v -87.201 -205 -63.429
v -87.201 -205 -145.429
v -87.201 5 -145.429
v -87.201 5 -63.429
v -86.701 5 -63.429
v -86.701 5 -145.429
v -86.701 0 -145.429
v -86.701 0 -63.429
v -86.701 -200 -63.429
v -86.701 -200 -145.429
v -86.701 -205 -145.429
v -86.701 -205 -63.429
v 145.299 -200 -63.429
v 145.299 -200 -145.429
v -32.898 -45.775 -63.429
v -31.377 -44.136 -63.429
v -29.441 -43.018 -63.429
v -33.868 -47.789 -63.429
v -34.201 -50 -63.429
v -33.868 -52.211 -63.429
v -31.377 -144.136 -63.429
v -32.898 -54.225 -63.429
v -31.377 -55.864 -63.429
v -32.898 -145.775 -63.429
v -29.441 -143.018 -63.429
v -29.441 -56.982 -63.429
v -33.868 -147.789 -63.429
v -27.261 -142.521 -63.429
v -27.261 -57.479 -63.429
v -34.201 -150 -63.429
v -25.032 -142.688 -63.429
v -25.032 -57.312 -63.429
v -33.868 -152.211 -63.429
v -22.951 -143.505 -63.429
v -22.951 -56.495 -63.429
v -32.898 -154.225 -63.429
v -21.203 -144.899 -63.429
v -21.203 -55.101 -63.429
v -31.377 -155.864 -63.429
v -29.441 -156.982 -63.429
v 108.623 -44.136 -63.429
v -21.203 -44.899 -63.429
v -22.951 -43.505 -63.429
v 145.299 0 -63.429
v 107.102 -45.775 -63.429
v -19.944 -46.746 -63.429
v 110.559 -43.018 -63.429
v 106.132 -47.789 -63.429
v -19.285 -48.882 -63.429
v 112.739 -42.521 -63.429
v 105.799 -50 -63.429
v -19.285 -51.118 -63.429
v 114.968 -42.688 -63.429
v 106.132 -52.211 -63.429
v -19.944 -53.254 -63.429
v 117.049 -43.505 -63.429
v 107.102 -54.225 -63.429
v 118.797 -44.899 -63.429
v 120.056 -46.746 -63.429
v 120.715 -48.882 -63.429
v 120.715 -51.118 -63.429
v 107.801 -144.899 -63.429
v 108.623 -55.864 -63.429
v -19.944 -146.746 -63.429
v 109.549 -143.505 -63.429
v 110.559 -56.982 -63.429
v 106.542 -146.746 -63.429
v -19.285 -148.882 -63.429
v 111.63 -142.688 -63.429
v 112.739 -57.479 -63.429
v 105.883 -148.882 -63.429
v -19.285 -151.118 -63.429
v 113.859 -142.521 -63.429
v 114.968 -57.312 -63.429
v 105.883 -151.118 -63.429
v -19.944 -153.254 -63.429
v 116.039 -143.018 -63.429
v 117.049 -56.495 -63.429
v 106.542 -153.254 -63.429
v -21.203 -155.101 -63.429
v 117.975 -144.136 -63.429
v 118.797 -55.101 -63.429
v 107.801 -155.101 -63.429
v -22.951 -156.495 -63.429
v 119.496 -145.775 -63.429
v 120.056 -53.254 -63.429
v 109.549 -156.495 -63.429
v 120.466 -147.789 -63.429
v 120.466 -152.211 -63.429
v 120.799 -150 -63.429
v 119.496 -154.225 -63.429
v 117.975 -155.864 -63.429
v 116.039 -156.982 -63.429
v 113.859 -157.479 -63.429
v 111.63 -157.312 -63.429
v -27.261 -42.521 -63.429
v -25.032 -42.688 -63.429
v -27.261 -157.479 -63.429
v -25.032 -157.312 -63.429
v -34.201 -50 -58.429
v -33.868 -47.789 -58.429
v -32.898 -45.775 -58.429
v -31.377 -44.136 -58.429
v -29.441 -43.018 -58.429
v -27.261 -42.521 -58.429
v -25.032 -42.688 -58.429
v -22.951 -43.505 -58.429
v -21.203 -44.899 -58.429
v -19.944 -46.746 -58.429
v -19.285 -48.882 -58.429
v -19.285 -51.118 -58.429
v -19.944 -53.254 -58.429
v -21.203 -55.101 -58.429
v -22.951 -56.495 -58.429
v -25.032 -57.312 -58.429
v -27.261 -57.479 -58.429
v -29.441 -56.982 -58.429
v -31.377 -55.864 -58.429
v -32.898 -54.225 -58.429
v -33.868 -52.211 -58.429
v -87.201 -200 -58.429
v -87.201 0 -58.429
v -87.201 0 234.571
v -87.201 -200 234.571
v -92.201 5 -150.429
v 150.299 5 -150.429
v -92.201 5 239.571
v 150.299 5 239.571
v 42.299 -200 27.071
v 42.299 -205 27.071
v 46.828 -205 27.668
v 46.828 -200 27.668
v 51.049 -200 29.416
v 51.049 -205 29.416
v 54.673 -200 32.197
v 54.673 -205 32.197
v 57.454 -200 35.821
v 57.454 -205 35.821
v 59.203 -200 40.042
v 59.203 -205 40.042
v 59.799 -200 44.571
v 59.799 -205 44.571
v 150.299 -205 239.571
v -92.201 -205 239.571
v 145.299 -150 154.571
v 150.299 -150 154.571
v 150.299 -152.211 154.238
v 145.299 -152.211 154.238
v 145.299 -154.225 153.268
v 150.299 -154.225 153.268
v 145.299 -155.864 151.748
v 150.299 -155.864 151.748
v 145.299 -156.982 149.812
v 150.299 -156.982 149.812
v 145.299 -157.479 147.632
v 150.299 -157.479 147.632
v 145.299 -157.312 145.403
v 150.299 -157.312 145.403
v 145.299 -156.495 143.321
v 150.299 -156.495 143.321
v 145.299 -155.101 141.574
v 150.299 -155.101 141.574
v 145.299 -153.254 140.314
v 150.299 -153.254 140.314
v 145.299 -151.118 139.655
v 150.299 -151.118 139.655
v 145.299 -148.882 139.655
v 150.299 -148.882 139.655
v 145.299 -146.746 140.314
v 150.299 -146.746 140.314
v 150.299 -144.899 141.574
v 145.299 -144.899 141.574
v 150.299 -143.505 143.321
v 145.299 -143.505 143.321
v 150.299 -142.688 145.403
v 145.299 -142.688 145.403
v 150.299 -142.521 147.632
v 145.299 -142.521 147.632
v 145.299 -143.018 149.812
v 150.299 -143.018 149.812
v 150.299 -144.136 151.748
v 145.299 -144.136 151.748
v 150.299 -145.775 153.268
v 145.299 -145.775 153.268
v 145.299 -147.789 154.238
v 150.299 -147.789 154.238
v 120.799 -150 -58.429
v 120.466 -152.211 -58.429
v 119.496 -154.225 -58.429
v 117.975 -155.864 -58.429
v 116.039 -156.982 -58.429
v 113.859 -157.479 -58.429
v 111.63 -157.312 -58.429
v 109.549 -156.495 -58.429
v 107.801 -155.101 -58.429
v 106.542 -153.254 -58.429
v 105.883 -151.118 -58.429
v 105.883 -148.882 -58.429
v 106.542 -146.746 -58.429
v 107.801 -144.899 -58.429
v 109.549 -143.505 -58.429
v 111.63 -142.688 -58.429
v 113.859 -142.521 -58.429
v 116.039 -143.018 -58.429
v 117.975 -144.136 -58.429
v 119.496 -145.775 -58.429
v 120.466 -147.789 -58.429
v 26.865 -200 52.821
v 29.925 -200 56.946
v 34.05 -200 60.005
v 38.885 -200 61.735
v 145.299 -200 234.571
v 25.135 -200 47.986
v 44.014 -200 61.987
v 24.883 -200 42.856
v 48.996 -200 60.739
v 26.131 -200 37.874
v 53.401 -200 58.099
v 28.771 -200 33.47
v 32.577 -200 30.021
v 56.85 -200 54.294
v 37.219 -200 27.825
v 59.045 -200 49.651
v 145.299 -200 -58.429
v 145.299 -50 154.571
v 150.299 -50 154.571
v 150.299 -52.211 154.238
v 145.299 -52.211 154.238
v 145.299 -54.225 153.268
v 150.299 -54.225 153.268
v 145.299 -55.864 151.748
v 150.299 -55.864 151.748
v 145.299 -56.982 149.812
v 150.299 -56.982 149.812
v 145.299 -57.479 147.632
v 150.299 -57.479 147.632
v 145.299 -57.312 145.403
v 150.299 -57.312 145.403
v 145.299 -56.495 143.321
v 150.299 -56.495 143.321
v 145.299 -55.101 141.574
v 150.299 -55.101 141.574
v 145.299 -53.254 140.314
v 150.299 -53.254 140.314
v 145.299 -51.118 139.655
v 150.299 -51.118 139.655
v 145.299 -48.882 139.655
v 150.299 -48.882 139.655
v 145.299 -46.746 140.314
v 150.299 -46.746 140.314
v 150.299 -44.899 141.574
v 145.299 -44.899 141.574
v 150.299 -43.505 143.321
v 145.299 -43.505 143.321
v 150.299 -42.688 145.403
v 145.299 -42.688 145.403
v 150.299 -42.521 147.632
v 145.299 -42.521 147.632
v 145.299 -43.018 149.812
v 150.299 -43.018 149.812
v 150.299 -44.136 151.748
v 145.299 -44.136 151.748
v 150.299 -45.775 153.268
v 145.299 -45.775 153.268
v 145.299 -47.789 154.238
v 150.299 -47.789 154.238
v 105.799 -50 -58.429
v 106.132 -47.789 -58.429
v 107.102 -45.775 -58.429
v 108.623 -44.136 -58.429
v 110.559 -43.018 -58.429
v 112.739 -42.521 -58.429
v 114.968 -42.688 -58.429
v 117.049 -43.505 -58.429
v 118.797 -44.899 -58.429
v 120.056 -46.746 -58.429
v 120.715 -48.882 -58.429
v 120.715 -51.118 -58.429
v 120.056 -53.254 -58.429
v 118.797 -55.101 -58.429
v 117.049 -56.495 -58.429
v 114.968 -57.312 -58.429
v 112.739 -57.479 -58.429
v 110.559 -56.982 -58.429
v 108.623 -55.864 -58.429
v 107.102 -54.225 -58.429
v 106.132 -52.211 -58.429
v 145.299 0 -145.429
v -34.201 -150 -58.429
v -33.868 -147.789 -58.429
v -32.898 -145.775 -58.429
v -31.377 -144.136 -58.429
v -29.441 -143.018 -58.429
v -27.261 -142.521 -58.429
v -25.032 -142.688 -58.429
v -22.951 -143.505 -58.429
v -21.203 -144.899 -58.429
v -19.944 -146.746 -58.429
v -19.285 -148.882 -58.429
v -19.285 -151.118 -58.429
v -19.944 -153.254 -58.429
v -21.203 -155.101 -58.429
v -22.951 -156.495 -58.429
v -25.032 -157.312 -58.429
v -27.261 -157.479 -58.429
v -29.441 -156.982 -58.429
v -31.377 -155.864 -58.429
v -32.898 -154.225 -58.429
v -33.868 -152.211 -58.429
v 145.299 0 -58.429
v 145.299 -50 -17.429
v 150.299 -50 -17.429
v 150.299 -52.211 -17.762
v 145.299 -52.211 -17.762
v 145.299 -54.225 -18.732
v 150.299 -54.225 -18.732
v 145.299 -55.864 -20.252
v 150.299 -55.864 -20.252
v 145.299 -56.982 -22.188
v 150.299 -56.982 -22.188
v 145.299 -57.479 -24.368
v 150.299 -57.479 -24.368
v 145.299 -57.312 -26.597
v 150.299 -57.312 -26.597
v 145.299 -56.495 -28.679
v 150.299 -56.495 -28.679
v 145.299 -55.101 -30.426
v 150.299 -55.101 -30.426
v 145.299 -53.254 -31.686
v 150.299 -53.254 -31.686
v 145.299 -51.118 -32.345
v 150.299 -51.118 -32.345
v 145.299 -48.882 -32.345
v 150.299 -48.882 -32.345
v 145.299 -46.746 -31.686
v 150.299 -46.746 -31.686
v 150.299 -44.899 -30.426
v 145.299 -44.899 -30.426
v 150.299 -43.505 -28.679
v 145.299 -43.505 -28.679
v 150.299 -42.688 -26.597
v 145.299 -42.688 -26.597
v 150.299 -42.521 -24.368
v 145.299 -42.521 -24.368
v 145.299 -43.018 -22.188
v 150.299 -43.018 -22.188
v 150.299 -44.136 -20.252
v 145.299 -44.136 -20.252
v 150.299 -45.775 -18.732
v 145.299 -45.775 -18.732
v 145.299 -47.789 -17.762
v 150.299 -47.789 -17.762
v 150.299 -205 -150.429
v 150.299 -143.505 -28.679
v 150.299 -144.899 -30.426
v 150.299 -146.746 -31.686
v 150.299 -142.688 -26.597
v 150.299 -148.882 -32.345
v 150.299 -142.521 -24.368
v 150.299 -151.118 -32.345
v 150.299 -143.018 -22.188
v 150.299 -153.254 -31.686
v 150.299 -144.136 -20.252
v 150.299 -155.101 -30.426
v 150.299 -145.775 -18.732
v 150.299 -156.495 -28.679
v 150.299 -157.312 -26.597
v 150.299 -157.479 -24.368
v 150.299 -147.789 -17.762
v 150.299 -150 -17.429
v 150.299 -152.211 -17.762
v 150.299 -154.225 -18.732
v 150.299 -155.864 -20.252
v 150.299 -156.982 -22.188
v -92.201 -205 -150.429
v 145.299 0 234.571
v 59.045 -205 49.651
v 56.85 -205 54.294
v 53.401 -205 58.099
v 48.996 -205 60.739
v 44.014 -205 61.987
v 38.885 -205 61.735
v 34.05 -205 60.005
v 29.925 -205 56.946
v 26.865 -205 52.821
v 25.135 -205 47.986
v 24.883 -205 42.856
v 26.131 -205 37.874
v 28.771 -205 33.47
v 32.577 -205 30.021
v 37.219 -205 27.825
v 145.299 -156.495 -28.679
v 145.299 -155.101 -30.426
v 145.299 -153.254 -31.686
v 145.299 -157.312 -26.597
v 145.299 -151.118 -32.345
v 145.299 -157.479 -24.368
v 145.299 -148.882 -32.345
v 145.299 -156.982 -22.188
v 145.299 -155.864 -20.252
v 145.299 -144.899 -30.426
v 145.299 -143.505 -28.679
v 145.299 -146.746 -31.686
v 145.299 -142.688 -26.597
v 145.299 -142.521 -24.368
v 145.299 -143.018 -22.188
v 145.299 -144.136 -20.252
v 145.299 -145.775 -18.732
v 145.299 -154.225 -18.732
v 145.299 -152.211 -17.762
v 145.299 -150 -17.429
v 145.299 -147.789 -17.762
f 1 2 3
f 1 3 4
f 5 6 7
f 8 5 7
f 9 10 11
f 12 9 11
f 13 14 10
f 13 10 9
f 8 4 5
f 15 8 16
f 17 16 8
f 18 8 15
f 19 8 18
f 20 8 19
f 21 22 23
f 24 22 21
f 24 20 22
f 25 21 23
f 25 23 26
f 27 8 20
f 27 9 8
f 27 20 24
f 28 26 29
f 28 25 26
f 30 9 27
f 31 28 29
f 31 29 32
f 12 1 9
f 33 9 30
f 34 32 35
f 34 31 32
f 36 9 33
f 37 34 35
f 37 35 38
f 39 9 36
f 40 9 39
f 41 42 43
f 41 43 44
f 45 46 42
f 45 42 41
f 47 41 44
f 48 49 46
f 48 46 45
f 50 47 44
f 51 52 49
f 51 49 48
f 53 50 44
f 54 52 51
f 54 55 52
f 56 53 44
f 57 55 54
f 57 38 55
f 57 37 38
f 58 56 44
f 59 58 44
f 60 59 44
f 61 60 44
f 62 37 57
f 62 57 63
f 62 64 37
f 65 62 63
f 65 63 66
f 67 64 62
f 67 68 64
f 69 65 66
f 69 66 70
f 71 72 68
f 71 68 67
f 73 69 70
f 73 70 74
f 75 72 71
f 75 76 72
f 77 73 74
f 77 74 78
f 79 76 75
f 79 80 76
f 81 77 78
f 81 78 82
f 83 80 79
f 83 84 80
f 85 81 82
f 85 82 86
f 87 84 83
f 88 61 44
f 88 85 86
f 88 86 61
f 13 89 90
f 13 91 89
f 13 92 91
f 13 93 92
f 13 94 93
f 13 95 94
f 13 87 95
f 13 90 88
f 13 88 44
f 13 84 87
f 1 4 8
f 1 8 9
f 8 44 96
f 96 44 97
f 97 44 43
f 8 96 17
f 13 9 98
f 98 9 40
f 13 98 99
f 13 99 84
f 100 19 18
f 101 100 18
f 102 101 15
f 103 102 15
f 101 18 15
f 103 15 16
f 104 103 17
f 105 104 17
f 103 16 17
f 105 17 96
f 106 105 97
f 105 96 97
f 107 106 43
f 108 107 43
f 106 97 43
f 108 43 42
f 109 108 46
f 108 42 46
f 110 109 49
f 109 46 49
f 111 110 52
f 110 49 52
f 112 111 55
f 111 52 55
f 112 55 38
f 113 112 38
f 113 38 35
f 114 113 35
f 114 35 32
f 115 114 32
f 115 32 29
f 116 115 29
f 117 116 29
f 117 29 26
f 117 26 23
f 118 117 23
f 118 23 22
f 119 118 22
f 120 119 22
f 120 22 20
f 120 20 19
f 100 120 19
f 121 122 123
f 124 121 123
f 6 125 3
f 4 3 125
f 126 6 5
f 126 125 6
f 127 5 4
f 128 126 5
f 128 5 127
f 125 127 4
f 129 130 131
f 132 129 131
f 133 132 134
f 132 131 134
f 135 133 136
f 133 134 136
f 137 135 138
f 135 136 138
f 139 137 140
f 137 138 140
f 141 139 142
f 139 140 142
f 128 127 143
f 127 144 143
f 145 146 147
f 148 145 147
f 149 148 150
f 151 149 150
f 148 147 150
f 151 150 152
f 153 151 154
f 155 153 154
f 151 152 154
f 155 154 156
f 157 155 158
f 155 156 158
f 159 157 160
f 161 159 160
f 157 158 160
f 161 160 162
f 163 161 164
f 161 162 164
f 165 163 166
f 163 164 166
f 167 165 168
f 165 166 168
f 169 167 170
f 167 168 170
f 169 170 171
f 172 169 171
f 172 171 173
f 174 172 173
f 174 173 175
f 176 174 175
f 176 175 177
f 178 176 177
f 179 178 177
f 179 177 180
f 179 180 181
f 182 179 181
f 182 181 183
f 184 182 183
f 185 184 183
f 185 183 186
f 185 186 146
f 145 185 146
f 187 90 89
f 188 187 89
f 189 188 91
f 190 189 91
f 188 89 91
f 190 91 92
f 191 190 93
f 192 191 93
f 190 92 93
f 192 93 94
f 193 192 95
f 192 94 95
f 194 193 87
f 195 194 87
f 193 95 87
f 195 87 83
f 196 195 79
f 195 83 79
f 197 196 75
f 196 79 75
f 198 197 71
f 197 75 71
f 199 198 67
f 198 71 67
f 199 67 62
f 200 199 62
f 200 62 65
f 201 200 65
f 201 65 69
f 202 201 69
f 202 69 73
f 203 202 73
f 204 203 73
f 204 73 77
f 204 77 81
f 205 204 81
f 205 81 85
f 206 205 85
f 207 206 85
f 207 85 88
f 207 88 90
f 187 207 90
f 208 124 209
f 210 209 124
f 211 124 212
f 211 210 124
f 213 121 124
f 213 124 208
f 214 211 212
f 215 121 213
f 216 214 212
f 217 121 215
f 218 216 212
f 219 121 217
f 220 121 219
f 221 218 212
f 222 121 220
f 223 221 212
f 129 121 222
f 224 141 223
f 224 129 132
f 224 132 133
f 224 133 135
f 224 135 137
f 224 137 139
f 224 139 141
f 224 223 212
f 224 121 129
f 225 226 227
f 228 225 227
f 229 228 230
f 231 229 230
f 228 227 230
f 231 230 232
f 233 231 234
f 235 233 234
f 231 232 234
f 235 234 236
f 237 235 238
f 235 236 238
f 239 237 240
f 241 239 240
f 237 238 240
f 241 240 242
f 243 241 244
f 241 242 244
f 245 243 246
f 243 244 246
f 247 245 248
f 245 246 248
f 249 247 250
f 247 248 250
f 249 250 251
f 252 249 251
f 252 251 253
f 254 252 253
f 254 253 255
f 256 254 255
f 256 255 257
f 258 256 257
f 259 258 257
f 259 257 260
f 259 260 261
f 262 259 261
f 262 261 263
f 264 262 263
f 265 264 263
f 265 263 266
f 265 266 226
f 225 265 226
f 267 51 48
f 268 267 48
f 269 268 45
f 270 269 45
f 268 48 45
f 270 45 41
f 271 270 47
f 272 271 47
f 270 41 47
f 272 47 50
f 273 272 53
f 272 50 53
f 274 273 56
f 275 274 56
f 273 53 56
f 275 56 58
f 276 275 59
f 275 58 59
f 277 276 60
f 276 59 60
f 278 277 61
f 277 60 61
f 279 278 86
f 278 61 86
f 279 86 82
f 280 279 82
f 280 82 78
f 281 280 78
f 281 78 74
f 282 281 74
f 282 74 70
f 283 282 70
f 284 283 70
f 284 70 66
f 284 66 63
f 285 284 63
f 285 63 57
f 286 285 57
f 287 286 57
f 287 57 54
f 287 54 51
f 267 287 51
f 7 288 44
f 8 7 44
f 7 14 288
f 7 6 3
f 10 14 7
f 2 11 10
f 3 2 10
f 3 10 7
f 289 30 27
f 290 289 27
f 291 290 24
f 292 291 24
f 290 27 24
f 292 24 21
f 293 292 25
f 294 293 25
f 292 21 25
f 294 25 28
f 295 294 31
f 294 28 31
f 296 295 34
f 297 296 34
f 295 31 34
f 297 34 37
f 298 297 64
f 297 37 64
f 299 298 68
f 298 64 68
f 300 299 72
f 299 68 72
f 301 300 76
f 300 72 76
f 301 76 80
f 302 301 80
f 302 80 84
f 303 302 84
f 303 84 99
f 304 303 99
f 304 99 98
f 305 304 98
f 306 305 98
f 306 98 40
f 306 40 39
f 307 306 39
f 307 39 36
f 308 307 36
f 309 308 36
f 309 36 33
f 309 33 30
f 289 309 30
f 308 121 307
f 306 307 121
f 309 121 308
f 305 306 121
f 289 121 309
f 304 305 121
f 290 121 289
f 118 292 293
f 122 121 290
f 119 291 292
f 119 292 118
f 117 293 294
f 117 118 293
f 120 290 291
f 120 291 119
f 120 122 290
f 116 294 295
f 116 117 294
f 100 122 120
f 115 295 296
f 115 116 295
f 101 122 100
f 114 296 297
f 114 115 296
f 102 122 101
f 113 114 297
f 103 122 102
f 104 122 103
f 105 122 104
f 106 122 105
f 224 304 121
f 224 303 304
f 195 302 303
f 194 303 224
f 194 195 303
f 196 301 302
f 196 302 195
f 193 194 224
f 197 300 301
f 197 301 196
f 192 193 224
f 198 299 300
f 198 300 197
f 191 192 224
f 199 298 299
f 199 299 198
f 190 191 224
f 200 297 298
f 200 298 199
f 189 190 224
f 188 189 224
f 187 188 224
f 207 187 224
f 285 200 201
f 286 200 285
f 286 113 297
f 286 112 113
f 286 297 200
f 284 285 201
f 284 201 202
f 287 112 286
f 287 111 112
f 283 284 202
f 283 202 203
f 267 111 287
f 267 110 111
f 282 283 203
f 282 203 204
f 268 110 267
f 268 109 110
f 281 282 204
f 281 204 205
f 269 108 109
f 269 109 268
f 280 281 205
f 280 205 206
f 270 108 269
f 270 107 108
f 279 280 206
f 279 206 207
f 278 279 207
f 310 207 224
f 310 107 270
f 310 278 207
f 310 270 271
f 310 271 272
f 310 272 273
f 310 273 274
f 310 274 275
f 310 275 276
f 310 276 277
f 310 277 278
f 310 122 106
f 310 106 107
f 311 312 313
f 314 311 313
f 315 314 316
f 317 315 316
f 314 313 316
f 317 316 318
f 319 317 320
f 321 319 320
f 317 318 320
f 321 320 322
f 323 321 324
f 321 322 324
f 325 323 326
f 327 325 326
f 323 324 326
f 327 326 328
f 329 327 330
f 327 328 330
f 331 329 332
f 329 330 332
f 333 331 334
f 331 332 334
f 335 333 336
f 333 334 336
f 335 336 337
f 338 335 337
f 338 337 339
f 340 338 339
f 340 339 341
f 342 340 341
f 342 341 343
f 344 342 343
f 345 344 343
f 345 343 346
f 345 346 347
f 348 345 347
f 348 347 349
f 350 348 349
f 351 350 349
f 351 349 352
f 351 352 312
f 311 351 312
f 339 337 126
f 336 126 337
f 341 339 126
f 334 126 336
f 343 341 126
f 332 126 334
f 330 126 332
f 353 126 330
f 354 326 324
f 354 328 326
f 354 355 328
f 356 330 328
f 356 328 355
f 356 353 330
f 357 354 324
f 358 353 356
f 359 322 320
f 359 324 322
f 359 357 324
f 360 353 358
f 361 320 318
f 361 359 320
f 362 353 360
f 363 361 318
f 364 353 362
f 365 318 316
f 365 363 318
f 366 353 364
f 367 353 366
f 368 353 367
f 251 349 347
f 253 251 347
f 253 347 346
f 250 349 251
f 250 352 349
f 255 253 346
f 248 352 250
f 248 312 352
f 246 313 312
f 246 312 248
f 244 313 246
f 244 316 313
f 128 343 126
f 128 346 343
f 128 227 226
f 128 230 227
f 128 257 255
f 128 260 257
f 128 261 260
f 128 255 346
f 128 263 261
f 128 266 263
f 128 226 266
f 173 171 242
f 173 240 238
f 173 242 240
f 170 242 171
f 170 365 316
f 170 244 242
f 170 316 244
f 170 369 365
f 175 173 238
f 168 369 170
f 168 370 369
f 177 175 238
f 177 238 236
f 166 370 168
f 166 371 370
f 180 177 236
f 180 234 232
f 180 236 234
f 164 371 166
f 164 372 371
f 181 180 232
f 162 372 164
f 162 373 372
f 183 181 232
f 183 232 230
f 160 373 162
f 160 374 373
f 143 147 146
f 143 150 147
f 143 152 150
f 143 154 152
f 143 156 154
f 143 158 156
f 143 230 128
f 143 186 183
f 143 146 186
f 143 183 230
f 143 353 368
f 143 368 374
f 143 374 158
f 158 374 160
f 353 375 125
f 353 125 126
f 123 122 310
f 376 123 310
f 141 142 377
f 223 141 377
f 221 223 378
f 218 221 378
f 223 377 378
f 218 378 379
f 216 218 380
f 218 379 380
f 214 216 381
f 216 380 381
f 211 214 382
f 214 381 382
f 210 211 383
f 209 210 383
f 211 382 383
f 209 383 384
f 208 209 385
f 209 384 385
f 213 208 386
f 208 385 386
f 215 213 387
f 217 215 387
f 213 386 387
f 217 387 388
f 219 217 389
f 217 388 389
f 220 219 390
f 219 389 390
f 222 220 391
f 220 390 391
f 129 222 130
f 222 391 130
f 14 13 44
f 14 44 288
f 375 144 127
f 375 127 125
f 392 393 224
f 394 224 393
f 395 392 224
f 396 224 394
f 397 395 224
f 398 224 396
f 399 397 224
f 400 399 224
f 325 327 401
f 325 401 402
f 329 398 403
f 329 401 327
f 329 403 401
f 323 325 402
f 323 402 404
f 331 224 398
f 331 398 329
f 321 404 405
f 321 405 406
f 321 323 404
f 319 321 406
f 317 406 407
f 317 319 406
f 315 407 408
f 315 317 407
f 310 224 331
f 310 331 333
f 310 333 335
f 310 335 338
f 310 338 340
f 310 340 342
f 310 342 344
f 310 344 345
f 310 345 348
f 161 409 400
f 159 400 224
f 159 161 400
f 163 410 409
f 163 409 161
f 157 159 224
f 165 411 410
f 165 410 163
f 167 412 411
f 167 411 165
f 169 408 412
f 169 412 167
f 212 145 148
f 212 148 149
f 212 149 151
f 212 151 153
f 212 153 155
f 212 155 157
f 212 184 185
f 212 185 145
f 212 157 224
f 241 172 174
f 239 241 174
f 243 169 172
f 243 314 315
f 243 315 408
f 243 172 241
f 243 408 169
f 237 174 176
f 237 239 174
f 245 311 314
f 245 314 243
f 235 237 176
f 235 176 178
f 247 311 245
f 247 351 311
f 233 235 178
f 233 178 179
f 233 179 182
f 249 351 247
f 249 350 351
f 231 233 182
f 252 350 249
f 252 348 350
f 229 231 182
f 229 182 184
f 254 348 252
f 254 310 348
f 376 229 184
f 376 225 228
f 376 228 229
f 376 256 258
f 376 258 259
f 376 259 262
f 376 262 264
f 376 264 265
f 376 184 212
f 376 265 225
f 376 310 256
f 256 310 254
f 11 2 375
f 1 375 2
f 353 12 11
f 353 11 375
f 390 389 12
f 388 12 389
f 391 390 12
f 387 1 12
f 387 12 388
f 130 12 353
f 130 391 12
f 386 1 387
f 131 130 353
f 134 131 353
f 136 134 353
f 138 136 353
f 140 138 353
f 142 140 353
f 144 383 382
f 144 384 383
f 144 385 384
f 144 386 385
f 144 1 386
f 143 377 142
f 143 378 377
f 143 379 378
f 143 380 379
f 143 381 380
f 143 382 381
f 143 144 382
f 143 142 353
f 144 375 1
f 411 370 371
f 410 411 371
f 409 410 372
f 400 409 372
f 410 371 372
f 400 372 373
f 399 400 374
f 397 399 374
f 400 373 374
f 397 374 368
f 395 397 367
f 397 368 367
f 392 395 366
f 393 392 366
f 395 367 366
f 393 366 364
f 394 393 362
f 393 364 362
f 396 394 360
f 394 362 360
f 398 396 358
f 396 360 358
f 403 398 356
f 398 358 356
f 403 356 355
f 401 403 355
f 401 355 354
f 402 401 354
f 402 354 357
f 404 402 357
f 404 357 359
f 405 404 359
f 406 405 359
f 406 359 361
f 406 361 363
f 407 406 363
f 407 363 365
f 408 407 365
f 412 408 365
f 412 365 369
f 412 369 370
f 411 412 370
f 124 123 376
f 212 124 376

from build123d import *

# Parameters (mm, degrees)
F0_W      = 232.5
F0_H      = 293
F1_DEPTH  = 200
F2_W      = 242.5
F2_H      = 5
F3_DEPTH  = 303
F5_DEPTH  = 25
F7_DEPTH  = 25
F9_DEPTH  = 210.001
F11_DEPTH = 210
F12_W     = 5
F12_H     = 82
F13_DEPTH = 232


with BuildPart() as f1:
    # F0 (on Front) → F1 (new body)
    with BuildSketch(Plane.XZ):
        Polygon((-92.2009944916, 239.5714490414), (-92.2009944916, 234.5714490414), (-92.2009944916, -63.4285509586), (150.2990055084, -63.4285509586), (150.2990055084, 239.5714490414), align=None)
        with Locations((29.0490055084, 88.0714490414)):
            Rectangle(F0_W, F0_H, mode=Mode.SUBTRACT)
    extrude(amount=F1_DEPTH)

    # F4 (on face) → F5 (cut)
    with BuildSketch(Plane.YZ.offset(150.2990055084)):
        with BuildLine():
            ThreePointArc((-42.5, 147.0714490414), (-44.6966991411, 152.3747499003), (-50, 154.5714490414))
            Line((-50, 154.5714490414), (-50, 147.0714490414))
            Line((-50, 147.0714490414), (-50, 139.5714490414))
            ThreePointArc((-50, 139.5714490414), (-44.6966991411, 141.7681481825), (-42.5, 147.0714490414))
        make_face()
        with BuildLine():
            ThreePointArc((-42.5, -24.9285509586), (-44.6966991411, -19.6252500997), (-50, -17.4285509586))
            Line((-50, -17.4285509586), (-50, -24.9285509586))
            Line((-50, -24.9285509586), (-50, -32.4285509586))
            ThreePointArc((-50, -32.4285509586), (-44.6966991411, -30.2318518175), (-42.5, -24.9285509586))
        make_face()
        with BuildLine():
            Line((-50, -24.9285509586), (-50, -17.4285509586))
            ThreePointArc((-50, -17.4285509586), (-57.5, -24.9285509586), (-50, -32.4285509586))
            Line((-50, -32.4285509586), (-50, -24.9285509586))
        make_face()
        with BuildLine():
            Line((-50, 147.0714490414), (-50, 154.5714490414))
            ThreePointArc((-50, 154.5714490414), (-57.5, 147.0714490414), (-50, 139.5714490414))
            Line((-50, 139.5714490414), (-50, 147.0714490414))
        make_face()
        with BuildLine():
            ThreePointArc((-142.5, 147.0714490414), (-144.6966991411, 152.3747499003), (-150, 154.5714490414))
            Line((-150, 154.5714490414), (-150, 147.0714490414))
            Line((-150, 147.0714490414), (-150, 139.5714490414))
            ThreePointArc((-150, 139.5714490414), (-144.6966991411, 141.7681481825), (-142.5, 147.0714490414))
        make_face()
        with BuildLine():
            ThreePointArc((-142.5, -24.9285509586), (-144.6966991411, -19.6252500997), (-150, -17.4285509586))
            Line((-150, -17.4285509586), (-150, -24.9285509586))
            Line((-150, -24.9285509586), (-150, -32.4285509586))
            ThreePointArc((-150, -32.4285509586), (-144.6966991411, -30.2318518175), (-142.5, -24.9285509586))
        make_face()
        with BuildLine():
            Line((-150, -24.9285509586), (-150, -17.4285509586))
            ThreePointArc((-150, -17.4285509586), (-157.5, -24.9285509586), (-150, -32.4285509586))
            Line((-150, -32.4285509586), (-150, -24.9285509586))
        make_face()
        with BuildLine():
            Line((-150, 147.0714490414), (-150, 154.5714490414))
            ThreePointArc((-150, 154.5714490414), (-157.5, 147.0714490414), (-150, 139.5714490414))
            Line((-150, 139.5714490414), (-150, 147.0714490414))
        make_face()
    extrude(amount=-F5_DEPTH, mode=Mode.SUBTRACT)

    # F6 (on face) → F7 (cut)
    with BuildSketch(Plane(origin=(0, 0, -63.4285509586), x_dir=(1, 0, 0), z_dir=(0, 0, -1))):
        with BuildLine():
            ThreePointArc((105.7990055084, 150), (113.2990055084, 142.5), (120.7990055084, 150))
            Line((120.7990055084, 150), (113.2990055084, 150))
            Line((113.2990055084, 150), (105.7990055084, 150))
        make_face()
        with BuildLine():
            Line((113.2990055084, 150), (120.7990055084, 150))
            ThreePointArc((120.7990055084, 150), (113.2990055084, 157.5), (105.7990055084, 150))
            Line((105.7990055084, 150), (113.2990055084, 150))
        make_face()
        with BuildLine():
            ThreePointArc((120.7990055084, 50), (113.2990055084, 57.5), (105.7990055084, 50))
            Line((105.7990055084, 50), (113.2990055084, 50))
            Line((113.2990055084, 50), (120.7990055084, 50))
        make_face()
        with BuildLine():
            Line((113.2990055084, 50), (105.7990055084, 50))
            ThreePointArc((105.7990055084, 50), (113.2990055084, 42.5), (120.7990055084, 50))
            Line((120.7990055084, 50), (113.2990055084, 50))
        make_face()
        with BuildLine():
            ThreePointArc((-19.2009944916, 50), (-21.3976936327, 55.3033008589), (-26.7009944916, 57.5))
            Line((-26.7009944916, 57.5), (-26.7009944916, 50))
            Line((-26.7009944916, 50), (-19.2009944916, 50))
        make_face()
        with BuildLine():
            Line((-26.7009944916, 50), (-26.7009944916, 57.5))
            ThreePointArc((-26.7009944916, 57.5), (-32.0042953505, 55.3033008589), (-34.2009944916, 50))
            Line((-34.2009944916, 50), (-26.7009944916, 50))
        make_face()
        with BuildLine():
            ThreePointArc((-26.7009944916, 142.5), (-21.3976936327, 144.6966991411), (-19.2009944916, 150))
            Line((-19.2009944916, 150), (-26.7009944916, 150))
            Line((-26.7009944916, 150), (-26.7009944916, 142.5))
        make_face()
        with BuildLine():
            Line((-26.7009944916, 150), (-19.2009944916, 150))
            ThreePointArc((-19.2009944916, 150), (-26.7009944916, 157.5), (-34.2009944916, 150))
            Line((-34.2009944916, 150), (-26.7009944916, 150))
        make_face()
        with BuildLine():
            Line((-26.7009944916, 142.5), (-26.7009944916, 150))
            Line((-26.7009944916, 150), (-34.2009944916, 150))
            ThreePointArc((-34.2009944916, 150), (-32.0042953505, 144.6966991411), (-26.7009944916, 142.5))
        make_face()
        with BuildLine():
            Line((-19.2009944916, 50), (-26.7009944916, 50))
            Line((-26.7009944916, 50), (-34.2009944916, 50))
            ThreePointArc((-34.2009944916, 50), (-26.7009944916, 42.5), (-19.2009944916, 50))
        make_face()
    extrude(amount=-F7_DEPTH, mode=Mode.SUBTRACT)



with BuildPart() as f3:
    # F2 (on face) → F3 (new body)
    with BuildSketch(Plane(origin=(0, 0, -63.4285509586), x_dir=(1, 0, 0), z_dir=(0, 0, -1))):
        with Locations((29.0490055084, 202.5)):
            Rectangle(F2_W, F2_H)
    extrude(amount=-F3_DEPTH)

    # F8 (on face) → F9 (cut, through all)
    with BuildSketch(Plane.XZ.offset(205)):
        with BuildLine():
            ThreePointArc((42.2990055084, 27.0714490414), (54.6733741792, 32.1970803706), (59.7990055084, 44.5714490414))
            ThreePointArc((59.7990055084, 44.5714490414), (29.9246368377, 56.9458177121), (42.2990055084, 27.0714490414))
        make_face()
    extrude(amount=-F9_DEPTH, mode=Mode.SUBTRACT)


with BuildPart() as f3b:
    # F2 (on face) → F3, piece 2 (new body)
    with BuildSketch(Plane(origin=(0, 0, -63.4285509586), x_dir=(1, 0, 0), z_dir=(0, 0, -1))):
        with Locations((29.0490055084, -2.5)):
            Rectangle(F2_W, F2_H)
    extrude(amount=-F3_DEPTH)


with BuildPart() as f1_1:
    add(f1.part)

    add(f3.part)  # F11 merges F3

    add(f3b.part)  # F11 merges F3b
    # F10 (on face) → F11 (join)
    with BuildSketch(Plane.XZ.offset(205)):
        Polygon((145.2990055084, -145.4285509586), (42.2990055084, -145.4285509586), (42.2990055084, -150.4285509586), (150.2990055084, -150.4285509586), (150.2990055084, -63.4285509586), (145.2990055084, -63.4285509586), align=None)
        Polygon((42.2990055084, -150.4285509586), (42.2990055084, -145.4285509586), (-87.2009944916, -145.4285509586), (-87.2009944916, -63.4285509586), (-92.2009944916, -63.4285509586), (-92.2009944916, -150.4285509586), align=None)
    extrude(amount=-F11_DEPTH)

    # F12 (on face) → F13 (join)
    with BuildSketch(Plane(origin=(145.2990055084, 0, 0), x_dir=(0, -1, 0), z_dir=(-1, 0, 0))):
        with Locations((-2.5, -104.4285509586)):
            Rectangle(F12_W, F12_H)
        with Locations((202.5, -104.4285509586)):
            Rectangle(F12_W, F12_H)
    extrude(amount=F13_DEPTH)


solid = f1_1.part
